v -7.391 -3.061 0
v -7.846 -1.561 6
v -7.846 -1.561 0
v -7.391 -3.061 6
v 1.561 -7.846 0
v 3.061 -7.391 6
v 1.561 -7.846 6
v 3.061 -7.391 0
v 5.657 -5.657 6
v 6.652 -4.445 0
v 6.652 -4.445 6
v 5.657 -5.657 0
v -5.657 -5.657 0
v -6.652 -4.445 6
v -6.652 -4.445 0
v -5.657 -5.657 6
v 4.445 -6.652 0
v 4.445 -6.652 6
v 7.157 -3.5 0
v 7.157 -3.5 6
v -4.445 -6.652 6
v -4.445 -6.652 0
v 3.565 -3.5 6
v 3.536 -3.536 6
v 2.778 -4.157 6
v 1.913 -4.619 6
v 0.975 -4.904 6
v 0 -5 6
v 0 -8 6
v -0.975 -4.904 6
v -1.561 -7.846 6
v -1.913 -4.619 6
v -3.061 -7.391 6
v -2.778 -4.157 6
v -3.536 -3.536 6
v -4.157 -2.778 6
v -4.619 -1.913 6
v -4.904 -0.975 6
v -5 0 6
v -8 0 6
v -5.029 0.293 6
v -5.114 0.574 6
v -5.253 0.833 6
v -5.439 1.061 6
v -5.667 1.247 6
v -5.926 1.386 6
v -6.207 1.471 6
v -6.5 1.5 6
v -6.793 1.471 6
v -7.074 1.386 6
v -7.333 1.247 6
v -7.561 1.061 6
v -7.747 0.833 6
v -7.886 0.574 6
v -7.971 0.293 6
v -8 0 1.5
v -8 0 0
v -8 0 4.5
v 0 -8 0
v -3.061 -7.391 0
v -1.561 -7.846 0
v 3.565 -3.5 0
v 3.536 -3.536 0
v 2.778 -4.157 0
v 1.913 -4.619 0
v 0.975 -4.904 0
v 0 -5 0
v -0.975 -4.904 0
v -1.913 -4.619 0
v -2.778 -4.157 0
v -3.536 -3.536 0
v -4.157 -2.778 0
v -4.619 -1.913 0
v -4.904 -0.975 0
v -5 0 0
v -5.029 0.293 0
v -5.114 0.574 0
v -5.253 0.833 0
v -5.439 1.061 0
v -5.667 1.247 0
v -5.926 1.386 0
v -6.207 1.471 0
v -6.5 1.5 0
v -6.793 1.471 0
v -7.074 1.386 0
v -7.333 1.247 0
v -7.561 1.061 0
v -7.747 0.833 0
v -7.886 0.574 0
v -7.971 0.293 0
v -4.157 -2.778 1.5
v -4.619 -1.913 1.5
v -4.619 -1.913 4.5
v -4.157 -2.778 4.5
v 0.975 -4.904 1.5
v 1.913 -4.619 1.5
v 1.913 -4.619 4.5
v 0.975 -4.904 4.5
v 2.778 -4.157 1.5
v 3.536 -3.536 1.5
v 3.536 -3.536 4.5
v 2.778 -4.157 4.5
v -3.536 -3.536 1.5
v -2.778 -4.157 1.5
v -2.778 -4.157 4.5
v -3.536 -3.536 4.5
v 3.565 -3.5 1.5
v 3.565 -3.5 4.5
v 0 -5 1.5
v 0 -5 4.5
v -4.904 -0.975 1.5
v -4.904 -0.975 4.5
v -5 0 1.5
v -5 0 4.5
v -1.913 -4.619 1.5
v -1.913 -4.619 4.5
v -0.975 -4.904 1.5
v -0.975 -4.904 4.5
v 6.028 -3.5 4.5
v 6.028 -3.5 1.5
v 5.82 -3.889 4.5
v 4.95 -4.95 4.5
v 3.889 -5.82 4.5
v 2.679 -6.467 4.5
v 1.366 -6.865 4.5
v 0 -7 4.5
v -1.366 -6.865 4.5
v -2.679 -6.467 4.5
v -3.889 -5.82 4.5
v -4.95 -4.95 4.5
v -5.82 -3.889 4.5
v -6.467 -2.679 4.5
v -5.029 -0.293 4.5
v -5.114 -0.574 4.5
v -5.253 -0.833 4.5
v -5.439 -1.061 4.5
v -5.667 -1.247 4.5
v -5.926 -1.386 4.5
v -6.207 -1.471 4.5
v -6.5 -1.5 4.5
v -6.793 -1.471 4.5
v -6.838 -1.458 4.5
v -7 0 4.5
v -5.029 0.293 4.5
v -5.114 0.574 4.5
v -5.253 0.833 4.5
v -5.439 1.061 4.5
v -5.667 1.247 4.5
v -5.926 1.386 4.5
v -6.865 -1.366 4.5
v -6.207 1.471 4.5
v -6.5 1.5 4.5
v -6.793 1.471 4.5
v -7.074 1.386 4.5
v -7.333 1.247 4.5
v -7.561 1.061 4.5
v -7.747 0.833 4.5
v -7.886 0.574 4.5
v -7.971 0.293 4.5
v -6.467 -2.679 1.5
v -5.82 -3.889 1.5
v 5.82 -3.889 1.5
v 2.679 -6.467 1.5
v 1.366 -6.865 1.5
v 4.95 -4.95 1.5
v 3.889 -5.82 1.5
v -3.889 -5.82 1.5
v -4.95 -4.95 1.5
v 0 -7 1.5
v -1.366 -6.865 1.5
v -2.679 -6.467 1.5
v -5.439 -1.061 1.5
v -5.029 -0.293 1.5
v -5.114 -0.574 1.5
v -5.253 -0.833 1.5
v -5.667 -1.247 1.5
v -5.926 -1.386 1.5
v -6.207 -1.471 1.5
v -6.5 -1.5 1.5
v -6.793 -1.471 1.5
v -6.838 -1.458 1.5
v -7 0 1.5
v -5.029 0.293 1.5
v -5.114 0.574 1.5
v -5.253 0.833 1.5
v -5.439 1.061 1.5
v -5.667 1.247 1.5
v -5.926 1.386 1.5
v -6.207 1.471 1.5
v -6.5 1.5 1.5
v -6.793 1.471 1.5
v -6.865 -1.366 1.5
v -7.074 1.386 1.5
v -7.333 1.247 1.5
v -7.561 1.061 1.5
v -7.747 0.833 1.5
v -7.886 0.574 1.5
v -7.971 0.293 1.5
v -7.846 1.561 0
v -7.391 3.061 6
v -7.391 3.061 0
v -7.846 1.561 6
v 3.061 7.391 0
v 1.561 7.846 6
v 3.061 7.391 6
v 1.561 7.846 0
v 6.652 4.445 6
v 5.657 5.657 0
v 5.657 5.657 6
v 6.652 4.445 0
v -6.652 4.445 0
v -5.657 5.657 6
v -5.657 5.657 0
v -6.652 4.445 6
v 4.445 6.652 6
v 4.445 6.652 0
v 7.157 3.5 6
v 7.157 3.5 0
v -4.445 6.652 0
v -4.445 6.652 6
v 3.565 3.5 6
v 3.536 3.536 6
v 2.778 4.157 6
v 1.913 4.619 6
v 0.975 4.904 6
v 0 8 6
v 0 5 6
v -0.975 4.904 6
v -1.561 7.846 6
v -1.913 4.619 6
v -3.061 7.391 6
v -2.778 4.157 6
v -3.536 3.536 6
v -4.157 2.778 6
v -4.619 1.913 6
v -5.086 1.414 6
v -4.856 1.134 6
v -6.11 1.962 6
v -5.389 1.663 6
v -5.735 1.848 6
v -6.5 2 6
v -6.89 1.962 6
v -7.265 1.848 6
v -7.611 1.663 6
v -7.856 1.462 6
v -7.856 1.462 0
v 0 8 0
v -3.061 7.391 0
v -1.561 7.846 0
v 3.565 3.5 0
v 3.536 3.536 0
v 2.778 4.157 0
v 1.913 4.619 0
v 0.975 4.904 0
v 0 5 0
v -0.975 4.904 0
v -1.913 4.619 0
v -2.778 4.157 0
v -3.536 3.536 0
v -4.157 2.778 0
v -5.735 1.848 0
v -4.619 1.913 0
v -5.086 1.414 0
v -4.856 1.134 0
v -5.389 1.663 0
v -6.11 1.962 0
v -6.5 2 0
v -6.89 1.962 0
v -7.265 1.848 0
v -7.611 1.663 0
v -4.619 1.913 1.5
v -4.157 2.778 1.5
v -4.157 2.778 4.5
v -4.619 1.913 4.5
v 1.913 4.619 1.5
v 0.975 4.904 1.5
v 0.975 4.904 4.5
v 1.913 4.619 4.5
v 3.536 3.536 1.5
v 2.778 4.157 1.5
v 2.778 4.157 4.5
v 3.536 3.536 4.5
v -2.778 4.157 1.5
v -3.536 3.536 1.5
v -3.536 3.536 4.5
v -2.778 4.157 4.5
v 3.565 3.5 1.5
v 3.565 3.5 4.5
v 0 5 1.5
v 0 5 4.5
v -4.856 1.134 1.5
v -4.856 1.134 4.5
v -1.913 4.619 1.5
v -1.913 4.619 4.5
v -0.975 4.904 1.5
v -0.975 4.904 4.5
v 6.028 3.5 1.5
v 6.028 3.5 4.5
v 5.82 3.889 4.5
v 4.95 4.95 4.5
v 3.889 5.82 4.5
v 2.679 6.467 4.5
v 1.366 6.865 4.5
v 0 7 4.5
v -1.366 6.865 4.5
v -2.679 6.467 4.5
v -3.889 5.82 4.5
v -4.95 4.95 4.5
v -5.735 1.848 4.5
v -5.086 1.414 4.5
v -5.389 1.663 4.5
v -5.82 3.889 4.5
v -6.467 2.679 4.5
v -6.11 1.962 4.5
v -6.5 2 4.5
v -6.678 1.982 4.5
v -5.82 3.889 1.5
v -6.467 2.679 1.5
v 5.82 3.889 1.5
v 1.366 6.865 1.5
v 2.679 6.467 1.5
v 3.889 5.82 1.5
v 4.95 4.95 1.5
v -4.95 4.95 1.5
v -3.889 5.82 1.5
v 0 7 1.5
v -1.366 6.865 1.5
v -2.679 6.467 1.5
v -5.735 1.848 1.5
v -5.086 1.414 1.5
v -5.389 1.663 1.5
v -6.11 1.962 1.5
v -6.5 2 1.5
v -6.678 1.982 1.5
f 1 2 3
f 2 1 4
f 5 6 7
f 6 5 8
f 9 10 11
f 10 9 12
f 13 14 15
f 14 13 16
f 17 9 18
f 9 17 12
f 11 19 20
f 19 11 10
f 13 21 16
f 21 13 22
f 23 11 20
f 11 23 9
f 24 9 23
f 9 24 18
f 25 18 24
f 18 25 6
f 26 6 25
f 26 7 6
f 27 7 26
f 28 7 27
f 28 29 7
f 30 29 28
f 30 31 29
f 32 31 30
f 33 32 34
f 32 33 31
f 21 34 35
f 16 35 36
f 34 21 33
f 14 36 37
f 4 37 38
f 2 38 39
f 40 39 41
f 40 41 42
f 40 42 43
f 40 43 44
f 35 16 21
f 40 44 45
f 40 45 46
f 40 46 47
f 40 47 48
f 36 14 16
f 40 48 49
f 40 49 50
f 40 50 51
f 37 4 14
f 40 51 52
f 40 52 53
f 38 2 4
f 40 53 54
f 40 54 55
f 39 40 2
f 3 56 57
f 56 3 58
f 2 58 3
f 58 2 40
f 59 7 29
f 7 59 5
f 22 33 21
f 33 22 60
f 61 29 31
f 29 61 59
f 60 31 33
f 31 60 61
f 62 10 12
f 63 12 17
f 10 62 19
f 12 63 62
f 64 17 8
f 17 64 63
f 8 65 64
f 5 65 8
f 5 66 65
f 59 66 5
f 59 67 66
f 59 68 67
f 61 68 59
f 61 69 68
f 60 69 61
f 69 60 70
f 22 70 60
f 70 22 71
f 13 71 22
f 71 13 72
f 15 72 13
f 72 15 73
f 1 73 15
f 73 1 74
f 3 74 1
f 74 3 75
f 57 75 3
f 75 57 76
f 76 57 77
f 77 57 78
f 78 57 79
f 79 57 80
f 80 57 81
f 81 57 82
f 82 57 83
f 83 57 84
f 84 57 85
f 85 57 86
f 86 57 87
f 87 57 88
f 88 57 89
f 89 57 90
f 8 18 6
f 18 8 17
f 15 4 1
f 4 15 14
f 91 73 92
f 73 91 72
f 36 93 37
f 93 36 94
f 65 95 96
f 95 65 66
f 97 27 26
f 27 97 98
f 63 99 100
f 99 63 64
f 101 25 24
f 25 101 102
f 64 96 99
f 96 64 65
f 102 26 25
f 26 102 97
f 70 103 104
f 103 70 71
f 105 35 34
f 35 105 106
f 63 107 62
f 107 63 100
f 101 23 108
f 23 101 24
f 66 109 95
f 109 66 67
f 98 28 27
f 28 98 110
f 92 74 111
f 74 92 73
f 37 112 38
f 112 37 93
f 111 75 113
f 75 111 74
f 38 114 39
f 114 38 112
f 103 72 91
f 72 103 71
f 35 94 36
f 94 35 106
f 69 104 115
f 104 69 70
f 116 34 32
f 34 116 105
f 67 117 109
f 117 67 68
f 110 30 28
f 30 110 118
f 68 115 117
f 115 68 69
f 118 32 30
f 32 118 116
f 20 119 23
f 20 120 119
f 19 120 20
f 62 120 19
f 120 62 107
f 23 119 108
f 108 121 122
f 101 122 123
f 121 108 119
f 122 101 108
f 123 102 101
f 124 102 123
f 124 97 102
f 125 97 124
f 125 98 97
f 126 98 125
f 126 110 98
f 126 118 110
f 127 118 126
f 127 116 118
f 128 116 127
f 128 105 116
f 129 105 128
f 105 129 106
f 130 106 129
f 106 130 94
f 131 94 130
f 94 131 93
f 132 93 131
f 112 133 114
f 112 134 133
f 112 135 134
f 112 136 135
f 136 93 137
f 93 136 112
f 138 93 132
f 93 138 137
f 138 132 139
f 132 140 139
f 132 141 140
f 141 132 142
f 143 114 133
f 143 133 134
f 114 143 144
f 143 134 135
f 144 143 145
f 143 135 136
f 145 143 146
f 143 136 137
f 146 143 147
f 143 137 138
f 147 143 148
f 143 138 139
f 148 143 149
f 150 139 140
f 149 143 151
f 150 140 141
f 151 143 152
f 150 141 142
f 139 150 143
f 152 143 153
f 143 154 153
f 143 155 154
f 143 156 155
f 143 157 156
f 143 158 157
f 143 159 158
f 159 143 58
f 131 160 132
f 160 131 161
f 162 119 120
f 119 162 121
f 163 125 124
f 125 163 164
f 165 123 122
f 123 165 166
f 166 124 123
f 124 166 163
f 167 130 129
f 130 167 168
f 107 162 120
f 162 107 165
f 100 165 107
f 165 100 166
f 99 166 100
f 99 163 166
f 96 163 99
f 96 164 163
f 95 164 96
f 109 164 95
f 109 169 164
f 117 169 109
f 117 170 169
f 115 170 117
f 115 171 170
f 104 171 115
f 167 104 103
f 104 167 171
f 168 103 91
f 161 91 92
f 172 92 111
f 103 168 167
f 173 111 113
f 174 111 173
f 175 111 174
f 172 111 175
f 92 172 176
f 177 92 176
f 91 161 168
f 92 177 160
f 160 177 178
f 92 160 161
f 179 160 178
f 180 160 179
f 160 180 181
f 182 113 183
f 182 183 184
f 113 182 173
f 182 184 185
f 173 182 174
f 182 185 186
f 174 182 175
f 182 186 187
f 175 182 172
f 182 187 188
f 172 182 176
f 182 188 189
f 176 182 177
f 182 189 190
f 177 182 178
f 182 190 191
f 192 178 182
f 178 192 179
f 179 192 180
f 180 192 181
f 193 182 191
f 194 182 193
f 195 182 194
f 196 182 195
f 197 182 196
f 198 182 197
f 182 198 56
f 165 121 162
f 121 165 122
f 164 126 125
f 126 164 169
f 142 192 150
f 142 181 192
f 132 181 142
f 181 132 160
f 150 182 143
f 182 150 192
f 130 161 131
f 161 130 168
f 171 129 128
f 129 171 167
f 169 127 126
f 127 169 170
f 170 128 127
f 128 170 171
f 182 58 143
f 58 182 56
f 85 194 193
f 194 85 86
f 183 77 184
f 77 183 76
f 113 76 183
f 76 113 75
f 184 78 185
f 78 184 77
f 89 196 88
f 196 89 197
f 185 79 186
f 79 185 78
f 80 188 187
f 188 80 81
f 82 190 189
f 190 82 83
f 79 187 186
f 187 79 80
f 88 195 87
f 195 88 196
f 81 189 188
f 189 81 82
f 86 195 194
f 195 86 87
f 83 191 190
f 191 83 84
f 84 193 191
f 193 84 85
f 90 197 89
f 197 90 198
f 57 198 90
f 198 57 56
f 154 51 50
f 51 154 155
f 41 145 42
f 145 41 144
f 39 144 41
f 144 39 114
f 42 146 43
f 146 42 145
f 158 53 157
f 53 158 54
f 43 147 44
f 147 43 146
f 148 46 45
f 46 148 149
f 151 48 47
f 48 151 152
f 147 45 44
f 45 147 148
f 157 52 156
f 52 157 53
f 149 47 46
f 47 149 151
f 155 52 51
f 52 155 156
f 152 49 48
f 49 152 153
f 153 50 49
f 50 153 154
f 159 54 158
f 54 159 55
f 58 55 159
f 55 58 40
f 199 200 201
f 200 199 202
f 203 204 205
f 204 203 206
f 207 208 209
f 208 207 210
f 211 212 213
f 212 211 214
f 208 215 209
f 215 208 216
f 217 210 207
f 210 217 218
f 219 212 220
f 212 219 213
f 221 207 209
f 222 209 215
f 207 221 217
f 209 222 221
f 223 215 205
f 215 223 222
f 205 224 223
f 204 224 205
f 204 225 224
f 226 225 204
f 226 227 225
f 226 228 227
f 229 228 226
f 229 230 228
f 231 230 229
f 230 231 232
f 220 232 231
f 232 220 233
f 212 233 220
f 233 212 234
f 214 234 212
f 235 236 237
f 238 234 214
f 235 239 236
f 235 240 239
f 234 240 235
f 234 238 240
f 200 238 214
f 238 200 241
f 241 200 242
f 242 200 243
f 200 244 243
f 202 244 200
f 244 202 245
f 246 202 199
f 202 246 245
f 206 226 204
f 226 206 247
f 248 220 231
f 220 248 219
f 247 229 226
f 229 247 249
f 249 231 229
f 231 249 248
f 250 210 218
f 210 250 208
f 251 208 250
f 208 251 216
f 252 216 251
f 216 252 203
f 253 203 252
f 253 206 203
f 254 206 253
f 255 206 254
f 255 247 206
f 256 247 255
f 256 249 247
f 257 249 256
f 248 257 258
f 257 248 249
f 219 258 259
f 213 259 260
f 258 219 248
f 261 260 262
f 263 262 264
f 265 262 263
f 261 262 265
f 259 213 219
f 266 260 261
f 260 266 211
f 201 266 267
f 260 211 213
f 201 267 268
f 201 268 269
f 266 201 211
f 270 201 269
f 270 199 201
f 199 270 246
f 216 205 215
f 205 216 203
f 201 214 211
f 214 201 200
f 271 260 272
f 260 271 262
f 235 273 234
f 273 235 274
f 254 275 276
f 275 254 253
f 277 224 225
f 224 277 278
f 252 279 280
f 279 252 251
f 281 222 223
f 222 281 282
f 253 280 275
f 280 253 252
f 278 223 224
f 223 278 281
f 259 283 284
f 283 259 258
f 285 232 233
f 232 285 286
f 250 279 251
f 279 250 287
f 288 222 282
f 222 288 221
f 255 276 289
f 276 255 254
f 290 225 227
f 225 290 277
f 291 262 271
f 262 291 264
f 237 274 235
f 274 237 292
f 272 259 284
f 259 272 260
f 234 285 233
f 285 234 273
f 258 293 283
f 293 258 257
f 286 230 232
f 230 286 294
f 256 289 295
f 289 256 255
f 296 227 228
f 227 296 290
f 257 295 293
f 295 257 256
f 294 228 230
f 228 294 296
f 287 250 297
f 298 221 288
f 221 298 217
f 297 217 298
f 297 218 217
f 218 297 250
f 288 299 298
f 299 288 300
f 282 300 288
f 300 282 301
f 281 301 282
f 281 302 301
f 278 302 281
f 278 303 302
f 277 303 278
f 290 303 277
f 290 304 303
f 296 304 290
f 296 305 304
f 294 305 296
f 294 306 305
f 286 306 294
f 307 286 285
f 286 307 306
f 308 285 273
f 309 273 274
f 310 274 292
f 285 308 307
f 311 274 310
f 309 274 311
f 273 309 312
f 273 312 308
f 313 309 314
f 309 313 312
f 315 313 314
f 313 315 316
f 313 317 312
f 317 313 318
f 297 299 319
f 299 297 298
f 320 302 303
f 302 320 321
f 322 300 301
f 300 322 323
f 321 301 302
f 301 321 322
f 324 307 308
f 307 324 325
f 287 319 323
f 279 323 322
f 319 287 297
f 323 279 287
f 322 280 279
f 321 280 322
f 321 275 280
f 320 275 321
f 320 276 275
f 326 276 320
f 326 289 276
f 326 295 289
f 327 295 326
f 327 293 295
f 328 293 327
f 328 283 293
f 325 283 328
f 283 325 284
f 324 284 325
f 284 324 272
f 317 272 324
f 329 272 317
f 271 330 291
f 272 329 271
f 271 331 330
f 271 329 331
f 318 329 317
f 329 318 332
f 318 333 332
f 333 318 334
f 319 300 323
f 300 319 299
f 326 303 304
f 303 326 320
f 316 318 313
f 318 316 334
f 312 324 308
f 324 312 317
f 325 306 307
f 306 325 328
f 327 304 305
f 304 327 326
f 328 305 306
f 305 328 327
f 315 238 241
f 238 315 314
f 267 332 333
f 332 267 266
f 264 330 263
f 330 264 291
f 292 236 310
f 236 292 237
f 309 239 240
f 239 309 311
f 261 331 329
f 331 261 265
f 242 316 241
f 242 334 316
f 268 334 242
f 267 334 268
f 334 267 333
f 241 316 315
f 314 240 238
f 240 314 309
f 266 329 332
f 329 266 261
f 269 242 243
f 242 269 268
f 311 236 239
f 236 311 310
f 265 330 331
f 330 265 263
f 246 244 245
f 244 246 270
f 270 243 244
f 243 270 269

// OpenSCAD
$fn=32;


concaveHalf();
mirror([0,1,0]) convexHalf();


module convexHalf() {
  difference() {
    halfRing();
    translate([-6.5,0,-0.1]) cylinder(r=2,h=6.2);
  }
}

module concaveHalf() {
  halfRing();
  translate([-6.5,0,0]) cylinder(r=1.5,h=1.5);
  translate([-6.5,0,4.5]) cylinder(r=1.5,h=1.5);
}

module halfRing() {
  difference() {
    cylinder(r=8,h=6);
    translate([0,0,-0.1]) cylinder(r=5,h=6.2);
    translate([0,-3.5,-0.1]) cube([10,7,6.2]);
    translate([0,0,1.5]) cylinder(r=7,h=3);
    translate([-10,0,-0.1]) cube([20,10,6.2]);
  } 
}
